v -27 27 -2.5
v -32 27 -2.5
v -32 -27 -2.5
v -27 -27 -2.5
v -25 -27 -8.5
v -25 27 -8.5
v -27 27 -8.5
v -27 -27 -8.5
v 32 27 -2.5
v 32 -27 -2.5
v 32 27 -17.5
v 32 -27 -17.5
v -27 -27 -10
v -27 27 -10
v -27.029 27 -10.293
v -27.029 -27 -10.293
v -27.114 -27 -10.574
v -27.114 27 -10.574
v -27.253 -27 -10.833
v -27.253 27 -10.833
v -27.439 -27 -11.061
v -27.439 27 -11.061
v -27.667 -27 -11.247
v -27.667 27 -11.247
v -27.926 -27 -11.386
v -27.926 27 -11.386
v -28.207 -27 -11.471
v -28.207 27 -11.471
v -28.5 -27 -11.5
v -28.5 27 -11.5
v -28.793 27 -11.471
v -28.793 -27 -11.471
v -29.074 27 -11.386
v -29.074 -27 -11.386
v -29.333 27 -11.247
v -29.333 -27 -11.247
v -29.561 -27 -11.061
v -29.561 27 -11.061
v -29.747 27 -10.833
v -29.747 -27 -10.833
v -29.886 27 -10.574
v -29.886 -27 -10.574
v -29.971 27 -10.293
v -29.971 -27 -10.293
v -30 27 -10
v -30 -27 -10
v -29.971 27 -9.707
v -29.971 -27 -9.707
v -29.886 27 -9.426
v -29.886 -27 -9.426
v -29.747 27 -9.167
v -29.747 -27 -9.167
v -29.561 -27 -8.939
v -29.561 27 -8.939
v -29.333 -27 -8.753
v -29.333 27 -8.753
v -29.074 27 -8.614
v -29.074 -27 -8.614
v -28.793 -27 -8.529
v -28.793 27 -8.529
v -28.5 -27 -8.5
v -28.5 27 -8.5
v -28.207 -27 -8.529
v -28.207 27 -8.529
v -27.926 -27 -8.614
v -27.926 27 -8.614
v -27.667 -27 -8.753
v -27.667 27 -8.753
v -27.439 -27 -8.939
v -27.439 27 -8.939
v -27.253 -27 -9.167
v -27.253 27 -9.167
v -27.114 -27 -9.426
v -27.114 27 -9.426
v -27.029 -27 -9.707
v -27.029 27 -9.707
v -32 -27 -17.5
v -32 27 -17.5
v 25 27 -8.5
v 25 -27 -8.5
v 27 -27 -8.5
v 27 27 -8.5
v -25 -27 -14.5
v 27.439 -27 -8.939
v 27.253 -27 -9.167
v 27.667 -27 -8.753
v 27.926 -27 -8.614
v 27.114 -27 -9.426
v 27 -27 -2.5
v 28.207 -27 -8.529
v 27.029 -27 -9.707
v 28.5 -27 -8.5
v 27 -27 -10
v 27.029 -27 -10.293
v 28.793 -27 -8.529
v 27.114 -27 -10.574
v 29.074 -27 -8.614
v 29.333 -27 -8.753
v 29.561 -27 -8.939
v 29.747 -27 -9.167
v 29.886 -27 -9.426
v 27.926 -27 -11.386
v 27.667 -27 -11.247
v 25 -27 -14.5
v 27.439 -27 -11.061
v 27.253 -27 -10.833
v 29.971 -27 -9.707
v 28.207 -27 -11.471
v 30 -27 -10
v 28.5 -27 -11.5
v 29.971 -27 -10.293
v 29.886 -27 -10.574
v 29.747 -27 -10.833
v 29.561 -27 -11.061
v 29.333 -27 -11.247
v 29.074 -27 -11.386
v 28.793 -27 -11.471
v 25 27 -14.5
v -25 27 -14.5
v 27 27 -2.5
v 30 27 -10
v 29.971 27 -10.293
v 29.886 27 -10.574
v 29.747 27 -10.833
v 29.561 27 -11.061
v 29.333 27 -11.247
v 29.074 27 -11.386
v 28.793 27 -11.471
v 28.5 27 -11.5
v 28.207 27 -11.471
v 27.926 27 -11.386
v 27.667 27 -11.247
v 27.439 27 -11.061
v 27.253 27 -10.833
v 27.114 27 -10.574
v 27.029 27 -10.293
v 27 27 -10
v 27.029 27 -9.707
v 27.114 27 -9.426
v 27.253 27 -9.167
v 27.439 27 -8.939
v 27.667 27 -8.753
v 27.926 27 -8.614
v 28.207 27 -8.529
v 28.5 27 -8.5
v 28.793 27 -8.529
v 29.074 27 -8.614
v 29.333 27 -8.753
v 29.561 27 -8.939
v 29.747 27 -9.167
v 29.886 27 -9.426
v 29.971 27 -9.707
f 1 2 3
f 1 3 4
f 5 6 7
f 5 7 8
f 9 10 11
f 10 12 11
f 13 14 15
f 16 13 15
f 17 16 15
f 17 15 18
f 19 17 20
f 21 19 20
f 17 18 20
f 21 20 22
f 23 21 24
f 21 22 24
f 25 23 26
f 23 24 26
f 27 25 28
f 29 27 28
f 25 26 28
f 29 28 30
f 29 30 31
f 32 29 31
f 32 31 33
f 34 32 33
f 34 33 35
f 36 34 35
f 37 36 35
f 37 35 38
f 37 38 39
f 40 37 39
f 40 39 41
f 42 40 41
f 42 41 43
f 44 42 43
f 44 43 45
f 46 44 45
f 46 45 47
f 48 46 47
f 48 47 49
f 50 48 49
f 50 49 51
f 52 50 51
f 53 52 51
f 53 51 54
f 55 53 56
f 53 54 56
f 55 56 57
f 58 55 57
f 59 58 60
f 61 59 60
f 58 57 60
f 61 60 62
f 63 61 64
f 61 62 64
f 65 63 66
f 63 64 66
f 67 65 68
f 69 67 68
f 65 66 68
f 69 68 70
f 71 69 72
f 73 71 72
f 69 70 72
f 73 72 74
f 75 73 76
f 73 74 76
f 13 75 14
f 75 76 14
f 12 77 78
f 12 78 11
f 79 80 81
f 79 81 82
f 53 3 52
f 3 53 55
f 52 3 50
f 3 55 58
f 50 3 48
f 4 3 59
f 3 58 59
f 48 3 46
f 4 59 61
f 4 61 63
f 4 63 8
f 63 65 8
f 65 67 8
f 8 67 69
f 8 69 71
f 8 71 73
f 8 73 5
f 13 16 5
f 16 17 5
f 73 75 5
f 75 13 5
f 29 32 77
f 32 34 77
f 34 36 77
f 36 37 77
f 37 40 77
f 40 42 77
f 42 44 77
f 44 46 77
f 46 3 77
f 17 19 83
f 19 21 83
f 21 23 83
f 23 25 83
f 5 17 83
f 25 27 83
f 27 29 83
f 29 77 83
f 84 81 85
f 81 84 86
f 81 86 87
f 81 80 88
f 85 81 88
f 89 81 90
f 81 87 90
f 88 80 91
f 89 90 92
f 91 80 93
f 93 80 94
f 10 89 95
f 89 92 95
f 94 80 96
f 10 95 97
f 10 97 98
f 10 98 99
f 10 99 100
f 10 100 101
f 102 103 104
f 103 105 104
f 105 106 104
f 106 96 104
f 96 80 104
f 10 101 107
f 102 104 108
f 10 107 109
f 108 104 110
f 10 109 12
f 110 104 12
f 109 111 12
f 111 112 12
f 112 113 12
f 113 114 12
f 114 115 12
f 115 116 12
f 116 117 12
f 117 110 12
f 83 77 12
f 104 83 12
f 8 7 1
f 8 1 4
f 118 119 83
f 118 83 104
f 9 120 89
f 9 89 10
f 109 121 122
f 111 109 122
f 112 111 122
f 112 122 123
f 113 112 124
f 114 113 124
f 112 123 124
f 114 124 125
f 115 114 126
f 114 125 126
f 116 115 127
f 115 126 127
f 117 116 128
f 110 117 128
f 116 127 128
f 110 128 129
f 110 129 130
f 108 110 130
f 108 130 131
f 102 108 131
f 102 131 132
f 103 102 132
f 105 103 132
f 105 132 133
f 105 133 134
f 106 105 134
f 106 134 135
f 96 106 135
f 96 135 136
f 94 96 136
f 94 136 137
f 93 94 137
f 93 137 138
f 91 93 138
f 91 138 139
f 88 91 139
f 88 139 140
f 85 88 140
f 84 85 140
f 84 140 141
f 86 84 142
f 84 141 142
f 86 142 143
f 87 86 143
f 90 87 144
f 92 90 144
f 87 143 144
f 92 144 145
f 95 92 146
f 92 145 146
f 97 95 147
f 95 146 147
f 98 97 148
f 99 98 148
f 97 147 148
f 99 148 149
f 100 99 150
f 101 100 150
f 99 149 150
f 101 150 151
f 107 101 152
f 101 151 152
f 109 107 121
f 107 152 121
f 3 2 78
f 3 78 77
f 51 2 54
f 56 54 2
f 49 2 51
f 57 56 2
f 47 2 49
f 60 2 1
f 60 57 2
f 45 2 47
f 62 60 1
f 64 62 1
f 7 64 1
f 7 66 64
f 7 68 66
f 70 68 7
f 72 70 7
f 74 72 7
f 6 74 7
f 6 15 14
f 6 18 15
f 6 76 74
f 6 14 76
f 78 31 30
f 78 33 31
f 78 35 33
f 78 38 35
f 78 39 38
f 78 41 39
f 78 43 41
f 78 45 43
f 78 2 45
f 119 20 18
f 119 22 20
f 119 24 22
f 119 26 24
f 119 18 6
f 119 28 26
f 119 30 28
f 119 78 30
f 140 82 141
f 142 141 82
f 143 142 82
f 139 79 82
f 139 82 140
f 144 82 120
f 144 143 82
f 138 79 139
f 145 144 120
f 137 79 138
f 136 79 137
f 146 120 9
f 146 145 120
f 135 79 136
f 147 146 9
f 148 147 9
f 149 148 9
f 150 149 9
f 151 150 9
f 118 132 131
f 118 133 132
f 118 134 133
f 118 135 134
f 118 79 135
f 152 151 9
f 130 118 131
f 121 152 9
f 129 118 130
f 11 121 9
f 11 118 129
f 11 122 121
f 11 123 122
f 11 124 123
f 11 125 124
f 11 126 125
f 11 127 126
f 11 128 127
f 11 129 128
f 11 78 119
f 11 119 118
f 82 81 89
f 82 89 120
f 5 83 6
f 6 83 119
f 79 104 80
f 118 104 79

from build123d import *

# Parameters (mm, degrees)
SKETCH004_W             = 64
SKETCH004_H             = 54
PAD002_DEPTH            = 3
SKETCH005_W             = 7
SKETCH005_H             = 54
PAD003_DEPTH            = 12
SKETCH008_R             = 1.5
POCKET003_DEPTH         = 60
SKETCH009_R             = 1.5
POCKET004_DEPTH         = 60
SKETCH016_W             = 54
SKETCH016_H             = 6
POCKET008_DEPTH         = 2
SKETCH017_W             = 54
SKETCH017_H             = 6
POCKET009_DEPTH         = 2
BODY001_PLACEMENT_ANGLE = 180


with BuildPart() as part:
    # Sketch004 → Pad002 (new body)
    with BuildSketch(Plane.XY):
        Rectangle(SKETCH004_W, SKETCH004_H)
    extrude(amount=PAD002_DEPTH)

    # Sketch005 (on Face5 of Pad002) → Pad003 (join)
    with BuildSketch(Plane(origin=(0, 0, 0), x_dir=(1, 0, 0), z_dir=(0, 0, -1))):
        with Locations((28.5, 0)):
            Rectangle(SKETCH005_W, SKETCH005_H)
        with Locations((-28.5, 0)):
            Rectangle(SKETCH005_W, SKETCH005_H)
    extrude(amount=PAD003_DEPTH)

    # Sketch008 (on Face15 of Pad003) → Pocket003 (cut)
    with BuildSketch(Plane.XZ.offset(27)):
        with Locations((28.5, -4.5)):
            Circle(SKETCH008_R)
    extrude(amount=-POCKET003_DEPTH, mode=Mode.SUBTRACT)

    # Sketch009 (on Face16 of Pocket003) → Pocket004 (cut)
    with BuildSketch(Plane.XZ.offset(27)):
        with Locations((-28.5, -4.5)):
            Circle(SKETCH009_R)
    extrude(amount=-POCKET004_DEPTH, mode=Mode.SUBTRACT)

    # Sketch016 (on Face11 of Pocket004) → Pocket008 (cut)
    with BuildSketch(Plane.YZ.offset(-25)):
        with Locations((0, -9)):
            Rectangle(SKETCH016_W, SKETCH016_H)
    extrude(amount=-POCKET008_DEPTH, mode=Mode.SUBTRACT)

    # Sketch017 (on Face16 of Pocket008) → Pocket009 (cut)
    with BuildSketch(Plane(origin=(25, 0, 0), x_dir=(0, -1, 0), z_dir=(-1, 0, 0))):
        with Locations((0, -9)):
            Rectangle(SKETCH017_W, SKETCH017_H)
    extrude(amount=-POCKET009_DEPTH, mode=Mode.SUBTRACT)


with BuildPart() as part_1:
    # Body001 placement: moved
    add(part.part.moved(Location((0, 0, -14.5))).rotate(Axis((0, 0, -14.5), (1, 0, 0)), BODY001_PLACEMENT_ANGLE))


solid = part_1.part
